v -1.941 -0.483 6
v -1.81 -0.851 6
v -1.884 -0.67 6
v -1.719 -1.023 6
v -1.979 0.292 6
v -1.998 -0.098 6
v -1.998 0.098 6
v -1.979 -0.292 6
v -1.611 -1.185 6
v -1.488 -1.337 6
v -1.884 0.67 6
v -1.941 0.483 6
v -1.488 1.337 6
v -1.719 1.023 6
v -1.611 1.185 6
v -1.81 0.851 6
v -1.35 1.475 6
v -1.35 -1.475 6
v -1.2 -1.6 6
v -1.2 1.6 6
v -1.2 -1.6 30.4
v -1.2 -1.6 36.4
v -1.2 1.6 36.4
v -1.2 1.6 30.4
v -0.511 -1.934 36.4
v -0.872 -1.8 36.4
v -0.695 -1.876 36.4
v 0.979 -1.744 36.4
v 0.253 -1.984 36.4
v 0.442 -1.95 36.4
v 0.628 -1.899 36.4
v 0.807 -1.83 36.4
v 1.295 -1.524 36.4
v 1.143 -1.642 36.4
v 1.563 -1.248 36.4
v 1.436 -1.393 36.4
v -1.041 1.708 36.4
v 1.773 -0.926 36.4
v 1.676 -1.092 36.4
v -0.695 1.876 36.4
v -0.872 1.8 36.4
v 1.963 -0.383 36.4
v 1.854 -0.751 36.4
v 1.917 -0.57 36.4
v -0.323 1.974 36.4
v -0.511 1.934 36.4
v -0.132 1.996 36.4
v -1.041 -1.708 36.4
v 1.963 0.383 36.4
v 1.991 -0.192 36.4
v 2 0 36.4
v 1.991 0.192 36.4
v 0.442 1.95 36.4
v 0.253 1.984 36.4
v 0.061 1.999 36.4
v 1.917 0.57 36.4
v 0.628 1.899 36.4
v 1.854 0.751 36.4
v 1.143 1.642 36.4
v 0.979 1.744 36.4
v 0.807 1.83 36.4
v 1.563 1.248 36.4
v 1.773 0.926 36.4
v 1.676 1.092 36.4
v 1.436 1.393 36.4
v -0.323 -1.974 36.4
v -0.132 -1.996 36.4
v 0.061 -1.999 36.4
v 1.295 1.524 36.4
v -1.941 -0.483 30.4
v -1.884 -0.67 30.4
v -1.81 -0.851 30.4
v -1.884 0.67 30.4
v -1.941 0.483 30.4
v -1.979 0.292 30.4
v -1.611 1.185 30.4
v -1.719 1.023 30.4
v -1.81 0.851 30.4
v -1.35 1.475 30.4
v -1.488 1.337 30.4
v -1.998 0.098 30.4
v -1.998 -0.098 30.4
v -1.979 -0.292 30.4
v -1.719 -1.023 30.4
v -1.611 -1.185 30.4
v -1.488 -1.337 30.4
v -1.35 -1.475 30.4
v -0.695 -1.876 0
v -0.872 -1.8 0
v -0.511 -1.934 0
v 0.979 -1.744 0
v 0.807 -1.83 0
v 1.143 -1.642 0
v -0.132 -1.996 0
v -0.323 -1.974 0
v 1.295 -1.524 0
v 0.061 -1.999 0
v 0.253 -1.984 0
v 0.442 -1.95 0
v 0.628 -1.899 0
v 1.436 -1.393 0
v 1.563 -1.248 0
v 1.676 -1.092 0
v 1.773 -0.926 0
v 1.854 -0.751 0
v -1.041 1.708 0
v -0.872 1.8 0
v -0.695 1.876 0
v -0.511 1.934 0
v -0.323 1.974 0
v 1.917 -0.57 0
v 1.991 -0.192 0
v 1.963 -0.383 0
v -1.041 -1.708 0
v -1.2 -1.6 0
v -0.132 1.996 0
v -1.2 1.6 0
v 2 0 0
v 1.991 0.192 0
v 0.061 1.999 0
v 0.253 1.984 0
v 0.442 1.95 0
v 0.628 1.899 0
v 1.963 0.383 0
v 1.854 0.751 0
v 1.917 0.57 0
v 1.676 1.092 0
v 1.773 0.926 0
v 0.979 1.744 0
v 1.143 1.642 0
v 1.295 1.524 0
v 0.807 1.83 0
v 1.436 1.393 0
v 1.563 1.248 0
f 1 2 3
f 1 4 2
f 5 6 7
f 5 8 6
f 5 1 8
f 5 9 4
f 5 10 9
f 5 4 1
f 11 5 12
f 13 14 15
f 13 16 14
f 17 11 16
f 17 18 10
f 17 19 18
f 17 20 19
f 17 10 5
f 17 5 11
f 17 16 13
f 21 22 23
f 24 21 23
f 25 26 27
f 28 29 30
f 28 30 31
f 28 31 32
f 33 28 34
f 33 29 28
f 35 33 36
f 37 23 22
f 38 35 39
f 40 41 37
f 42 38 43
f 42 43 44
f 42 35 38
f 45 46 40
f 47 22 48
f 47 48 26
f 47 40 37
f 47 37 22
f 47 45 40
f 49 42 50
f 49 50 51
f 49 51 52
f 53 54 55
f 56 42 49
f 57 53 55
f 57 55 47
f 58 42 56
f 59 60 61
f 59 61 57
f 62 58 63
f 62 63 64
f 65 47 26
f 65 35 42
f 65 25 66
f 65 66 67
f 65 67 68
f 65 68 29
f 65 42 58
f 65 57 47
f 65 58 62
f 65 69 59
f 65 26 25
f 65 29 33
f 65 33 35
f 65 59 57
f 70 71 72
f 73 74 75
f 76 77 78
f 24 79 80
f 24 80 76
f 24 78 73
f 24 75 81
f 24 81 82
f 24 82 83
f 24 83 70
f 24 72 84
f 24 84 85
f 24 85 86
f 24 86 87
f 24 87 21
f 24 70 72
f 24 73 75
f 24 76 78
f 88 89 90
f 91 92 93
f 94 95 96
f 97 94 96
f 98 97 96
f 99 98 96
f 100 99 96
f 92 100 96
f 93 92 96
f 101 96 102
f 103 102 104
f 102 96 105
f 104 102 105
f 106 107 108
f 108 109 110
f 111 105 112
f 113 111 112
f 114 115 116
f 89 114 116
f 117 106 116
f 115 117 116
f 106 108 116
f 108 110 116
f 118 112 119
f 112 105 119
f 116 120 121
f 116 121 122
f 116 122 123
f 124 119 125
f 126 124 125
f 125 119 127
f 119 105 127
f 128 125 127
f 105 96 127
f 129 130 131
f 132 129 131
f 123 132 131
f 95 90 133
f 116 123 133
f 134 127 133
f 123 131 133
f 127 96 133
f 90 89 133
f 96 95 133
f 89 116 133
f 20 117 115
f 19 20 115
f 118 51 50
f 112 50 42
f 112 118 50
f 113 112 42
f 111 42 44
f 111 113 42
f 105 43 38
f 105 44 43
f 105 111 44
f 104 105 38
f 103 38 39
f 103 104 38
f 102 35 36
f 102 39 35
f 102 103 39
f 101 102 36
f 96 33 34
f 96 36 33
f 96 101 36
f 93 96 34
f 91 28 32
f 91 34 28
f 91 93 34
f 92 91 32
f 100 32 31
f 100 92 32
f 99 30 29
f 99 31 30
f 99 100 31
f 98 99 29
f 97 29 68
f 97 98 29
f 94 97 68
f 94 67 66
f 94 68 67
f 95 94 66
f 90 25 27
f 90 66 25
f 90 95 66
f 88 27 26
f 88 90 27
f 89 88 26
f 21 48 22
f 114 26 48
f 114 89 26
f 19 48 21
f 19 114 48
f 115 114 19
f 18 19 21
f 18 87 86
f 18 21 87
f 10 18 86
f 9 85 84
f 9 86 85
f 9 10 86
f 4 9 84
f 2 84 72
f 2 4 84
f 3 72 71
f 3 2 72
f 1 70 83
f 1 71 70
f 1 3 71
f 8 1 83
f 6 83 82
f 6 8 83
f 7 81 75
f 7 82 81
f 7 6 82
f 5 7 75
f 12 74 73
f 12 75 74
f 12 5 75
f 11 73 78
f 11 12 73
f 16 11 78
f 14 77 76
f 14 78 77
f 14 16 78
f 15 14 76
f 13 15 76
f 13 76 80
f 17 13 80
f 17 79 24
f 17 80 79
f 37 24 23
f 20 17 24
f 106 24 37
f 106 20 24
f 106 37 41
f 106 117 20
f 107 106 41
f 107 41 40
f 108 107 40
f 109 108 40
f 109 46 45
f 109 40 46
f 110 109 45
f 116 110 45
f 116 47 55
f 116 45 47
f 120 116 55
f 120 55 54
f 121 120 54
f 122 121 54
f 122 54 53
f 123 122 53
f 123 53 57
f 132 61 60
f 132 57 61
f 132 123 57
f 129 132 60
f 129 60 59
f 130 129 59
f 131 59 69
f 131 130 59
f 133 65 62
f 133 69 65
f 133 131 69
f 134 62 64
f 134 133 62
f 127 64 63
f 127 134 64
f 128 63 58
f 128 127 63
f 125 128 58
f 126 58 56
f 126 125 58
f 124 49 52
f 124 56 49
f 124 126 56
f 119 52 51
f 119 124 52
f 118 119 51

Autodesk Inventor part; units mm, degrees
ref_plane "YZ Plane" through (0, 0, 0) normal (1, 0, 0) x (0, 1, 0)
ref_plane "XZ Plane" through (0, 0, 0) normal (0, 1, 0) x (-1, 0, 0)
ref_plane "XY Plane" through (0, 0, 0) normal (0, 0, 1) x (1, 0, 0)
sketch "スケッチ1" plane through (0, 0, 0) normal (0, 0, 1) x (1, 0, 0)
  circle A0 centre (0, 0) radius 2
  dimension "d0" = 4
extrude "押し出し1" add sketch "スケッチ1" along normal blind 36.4
sketch "スケッチ2" plane through (0, 0, 36.4) normal (0, 0, 1) x (1, 0, 0)
  circle A0 centre (0, 0) radius 2 projected
  line L0 (-1.2, -1.6) -> (-1.2, 1.6)
  circle A1 centre (0, 0) radius 2 projected
  dimension "d4" = 3.2
extrude "押し出し2" cut sketch "スケッチ2" against normal blind 6 contours L0 A0 picked at (-1.3118, -0.4272)
sketch "スケッチ3" plane through (0, 0, 0) normal (0, 0, -1) x (-1, 0, 0)
  line L0 (1.2, 1.6) -> (1.2, -1.6)
  circle A0 centre (0, 0) radius 2 projected
  dimension "d7" = 3.2
extrude "押し出し3" cut sketch "スケッチ3" against normal blind 6 contours A0 L0 picked at (1.6903, 0)
properties part number "shaft" material "アルミニウム 5052 H32"
